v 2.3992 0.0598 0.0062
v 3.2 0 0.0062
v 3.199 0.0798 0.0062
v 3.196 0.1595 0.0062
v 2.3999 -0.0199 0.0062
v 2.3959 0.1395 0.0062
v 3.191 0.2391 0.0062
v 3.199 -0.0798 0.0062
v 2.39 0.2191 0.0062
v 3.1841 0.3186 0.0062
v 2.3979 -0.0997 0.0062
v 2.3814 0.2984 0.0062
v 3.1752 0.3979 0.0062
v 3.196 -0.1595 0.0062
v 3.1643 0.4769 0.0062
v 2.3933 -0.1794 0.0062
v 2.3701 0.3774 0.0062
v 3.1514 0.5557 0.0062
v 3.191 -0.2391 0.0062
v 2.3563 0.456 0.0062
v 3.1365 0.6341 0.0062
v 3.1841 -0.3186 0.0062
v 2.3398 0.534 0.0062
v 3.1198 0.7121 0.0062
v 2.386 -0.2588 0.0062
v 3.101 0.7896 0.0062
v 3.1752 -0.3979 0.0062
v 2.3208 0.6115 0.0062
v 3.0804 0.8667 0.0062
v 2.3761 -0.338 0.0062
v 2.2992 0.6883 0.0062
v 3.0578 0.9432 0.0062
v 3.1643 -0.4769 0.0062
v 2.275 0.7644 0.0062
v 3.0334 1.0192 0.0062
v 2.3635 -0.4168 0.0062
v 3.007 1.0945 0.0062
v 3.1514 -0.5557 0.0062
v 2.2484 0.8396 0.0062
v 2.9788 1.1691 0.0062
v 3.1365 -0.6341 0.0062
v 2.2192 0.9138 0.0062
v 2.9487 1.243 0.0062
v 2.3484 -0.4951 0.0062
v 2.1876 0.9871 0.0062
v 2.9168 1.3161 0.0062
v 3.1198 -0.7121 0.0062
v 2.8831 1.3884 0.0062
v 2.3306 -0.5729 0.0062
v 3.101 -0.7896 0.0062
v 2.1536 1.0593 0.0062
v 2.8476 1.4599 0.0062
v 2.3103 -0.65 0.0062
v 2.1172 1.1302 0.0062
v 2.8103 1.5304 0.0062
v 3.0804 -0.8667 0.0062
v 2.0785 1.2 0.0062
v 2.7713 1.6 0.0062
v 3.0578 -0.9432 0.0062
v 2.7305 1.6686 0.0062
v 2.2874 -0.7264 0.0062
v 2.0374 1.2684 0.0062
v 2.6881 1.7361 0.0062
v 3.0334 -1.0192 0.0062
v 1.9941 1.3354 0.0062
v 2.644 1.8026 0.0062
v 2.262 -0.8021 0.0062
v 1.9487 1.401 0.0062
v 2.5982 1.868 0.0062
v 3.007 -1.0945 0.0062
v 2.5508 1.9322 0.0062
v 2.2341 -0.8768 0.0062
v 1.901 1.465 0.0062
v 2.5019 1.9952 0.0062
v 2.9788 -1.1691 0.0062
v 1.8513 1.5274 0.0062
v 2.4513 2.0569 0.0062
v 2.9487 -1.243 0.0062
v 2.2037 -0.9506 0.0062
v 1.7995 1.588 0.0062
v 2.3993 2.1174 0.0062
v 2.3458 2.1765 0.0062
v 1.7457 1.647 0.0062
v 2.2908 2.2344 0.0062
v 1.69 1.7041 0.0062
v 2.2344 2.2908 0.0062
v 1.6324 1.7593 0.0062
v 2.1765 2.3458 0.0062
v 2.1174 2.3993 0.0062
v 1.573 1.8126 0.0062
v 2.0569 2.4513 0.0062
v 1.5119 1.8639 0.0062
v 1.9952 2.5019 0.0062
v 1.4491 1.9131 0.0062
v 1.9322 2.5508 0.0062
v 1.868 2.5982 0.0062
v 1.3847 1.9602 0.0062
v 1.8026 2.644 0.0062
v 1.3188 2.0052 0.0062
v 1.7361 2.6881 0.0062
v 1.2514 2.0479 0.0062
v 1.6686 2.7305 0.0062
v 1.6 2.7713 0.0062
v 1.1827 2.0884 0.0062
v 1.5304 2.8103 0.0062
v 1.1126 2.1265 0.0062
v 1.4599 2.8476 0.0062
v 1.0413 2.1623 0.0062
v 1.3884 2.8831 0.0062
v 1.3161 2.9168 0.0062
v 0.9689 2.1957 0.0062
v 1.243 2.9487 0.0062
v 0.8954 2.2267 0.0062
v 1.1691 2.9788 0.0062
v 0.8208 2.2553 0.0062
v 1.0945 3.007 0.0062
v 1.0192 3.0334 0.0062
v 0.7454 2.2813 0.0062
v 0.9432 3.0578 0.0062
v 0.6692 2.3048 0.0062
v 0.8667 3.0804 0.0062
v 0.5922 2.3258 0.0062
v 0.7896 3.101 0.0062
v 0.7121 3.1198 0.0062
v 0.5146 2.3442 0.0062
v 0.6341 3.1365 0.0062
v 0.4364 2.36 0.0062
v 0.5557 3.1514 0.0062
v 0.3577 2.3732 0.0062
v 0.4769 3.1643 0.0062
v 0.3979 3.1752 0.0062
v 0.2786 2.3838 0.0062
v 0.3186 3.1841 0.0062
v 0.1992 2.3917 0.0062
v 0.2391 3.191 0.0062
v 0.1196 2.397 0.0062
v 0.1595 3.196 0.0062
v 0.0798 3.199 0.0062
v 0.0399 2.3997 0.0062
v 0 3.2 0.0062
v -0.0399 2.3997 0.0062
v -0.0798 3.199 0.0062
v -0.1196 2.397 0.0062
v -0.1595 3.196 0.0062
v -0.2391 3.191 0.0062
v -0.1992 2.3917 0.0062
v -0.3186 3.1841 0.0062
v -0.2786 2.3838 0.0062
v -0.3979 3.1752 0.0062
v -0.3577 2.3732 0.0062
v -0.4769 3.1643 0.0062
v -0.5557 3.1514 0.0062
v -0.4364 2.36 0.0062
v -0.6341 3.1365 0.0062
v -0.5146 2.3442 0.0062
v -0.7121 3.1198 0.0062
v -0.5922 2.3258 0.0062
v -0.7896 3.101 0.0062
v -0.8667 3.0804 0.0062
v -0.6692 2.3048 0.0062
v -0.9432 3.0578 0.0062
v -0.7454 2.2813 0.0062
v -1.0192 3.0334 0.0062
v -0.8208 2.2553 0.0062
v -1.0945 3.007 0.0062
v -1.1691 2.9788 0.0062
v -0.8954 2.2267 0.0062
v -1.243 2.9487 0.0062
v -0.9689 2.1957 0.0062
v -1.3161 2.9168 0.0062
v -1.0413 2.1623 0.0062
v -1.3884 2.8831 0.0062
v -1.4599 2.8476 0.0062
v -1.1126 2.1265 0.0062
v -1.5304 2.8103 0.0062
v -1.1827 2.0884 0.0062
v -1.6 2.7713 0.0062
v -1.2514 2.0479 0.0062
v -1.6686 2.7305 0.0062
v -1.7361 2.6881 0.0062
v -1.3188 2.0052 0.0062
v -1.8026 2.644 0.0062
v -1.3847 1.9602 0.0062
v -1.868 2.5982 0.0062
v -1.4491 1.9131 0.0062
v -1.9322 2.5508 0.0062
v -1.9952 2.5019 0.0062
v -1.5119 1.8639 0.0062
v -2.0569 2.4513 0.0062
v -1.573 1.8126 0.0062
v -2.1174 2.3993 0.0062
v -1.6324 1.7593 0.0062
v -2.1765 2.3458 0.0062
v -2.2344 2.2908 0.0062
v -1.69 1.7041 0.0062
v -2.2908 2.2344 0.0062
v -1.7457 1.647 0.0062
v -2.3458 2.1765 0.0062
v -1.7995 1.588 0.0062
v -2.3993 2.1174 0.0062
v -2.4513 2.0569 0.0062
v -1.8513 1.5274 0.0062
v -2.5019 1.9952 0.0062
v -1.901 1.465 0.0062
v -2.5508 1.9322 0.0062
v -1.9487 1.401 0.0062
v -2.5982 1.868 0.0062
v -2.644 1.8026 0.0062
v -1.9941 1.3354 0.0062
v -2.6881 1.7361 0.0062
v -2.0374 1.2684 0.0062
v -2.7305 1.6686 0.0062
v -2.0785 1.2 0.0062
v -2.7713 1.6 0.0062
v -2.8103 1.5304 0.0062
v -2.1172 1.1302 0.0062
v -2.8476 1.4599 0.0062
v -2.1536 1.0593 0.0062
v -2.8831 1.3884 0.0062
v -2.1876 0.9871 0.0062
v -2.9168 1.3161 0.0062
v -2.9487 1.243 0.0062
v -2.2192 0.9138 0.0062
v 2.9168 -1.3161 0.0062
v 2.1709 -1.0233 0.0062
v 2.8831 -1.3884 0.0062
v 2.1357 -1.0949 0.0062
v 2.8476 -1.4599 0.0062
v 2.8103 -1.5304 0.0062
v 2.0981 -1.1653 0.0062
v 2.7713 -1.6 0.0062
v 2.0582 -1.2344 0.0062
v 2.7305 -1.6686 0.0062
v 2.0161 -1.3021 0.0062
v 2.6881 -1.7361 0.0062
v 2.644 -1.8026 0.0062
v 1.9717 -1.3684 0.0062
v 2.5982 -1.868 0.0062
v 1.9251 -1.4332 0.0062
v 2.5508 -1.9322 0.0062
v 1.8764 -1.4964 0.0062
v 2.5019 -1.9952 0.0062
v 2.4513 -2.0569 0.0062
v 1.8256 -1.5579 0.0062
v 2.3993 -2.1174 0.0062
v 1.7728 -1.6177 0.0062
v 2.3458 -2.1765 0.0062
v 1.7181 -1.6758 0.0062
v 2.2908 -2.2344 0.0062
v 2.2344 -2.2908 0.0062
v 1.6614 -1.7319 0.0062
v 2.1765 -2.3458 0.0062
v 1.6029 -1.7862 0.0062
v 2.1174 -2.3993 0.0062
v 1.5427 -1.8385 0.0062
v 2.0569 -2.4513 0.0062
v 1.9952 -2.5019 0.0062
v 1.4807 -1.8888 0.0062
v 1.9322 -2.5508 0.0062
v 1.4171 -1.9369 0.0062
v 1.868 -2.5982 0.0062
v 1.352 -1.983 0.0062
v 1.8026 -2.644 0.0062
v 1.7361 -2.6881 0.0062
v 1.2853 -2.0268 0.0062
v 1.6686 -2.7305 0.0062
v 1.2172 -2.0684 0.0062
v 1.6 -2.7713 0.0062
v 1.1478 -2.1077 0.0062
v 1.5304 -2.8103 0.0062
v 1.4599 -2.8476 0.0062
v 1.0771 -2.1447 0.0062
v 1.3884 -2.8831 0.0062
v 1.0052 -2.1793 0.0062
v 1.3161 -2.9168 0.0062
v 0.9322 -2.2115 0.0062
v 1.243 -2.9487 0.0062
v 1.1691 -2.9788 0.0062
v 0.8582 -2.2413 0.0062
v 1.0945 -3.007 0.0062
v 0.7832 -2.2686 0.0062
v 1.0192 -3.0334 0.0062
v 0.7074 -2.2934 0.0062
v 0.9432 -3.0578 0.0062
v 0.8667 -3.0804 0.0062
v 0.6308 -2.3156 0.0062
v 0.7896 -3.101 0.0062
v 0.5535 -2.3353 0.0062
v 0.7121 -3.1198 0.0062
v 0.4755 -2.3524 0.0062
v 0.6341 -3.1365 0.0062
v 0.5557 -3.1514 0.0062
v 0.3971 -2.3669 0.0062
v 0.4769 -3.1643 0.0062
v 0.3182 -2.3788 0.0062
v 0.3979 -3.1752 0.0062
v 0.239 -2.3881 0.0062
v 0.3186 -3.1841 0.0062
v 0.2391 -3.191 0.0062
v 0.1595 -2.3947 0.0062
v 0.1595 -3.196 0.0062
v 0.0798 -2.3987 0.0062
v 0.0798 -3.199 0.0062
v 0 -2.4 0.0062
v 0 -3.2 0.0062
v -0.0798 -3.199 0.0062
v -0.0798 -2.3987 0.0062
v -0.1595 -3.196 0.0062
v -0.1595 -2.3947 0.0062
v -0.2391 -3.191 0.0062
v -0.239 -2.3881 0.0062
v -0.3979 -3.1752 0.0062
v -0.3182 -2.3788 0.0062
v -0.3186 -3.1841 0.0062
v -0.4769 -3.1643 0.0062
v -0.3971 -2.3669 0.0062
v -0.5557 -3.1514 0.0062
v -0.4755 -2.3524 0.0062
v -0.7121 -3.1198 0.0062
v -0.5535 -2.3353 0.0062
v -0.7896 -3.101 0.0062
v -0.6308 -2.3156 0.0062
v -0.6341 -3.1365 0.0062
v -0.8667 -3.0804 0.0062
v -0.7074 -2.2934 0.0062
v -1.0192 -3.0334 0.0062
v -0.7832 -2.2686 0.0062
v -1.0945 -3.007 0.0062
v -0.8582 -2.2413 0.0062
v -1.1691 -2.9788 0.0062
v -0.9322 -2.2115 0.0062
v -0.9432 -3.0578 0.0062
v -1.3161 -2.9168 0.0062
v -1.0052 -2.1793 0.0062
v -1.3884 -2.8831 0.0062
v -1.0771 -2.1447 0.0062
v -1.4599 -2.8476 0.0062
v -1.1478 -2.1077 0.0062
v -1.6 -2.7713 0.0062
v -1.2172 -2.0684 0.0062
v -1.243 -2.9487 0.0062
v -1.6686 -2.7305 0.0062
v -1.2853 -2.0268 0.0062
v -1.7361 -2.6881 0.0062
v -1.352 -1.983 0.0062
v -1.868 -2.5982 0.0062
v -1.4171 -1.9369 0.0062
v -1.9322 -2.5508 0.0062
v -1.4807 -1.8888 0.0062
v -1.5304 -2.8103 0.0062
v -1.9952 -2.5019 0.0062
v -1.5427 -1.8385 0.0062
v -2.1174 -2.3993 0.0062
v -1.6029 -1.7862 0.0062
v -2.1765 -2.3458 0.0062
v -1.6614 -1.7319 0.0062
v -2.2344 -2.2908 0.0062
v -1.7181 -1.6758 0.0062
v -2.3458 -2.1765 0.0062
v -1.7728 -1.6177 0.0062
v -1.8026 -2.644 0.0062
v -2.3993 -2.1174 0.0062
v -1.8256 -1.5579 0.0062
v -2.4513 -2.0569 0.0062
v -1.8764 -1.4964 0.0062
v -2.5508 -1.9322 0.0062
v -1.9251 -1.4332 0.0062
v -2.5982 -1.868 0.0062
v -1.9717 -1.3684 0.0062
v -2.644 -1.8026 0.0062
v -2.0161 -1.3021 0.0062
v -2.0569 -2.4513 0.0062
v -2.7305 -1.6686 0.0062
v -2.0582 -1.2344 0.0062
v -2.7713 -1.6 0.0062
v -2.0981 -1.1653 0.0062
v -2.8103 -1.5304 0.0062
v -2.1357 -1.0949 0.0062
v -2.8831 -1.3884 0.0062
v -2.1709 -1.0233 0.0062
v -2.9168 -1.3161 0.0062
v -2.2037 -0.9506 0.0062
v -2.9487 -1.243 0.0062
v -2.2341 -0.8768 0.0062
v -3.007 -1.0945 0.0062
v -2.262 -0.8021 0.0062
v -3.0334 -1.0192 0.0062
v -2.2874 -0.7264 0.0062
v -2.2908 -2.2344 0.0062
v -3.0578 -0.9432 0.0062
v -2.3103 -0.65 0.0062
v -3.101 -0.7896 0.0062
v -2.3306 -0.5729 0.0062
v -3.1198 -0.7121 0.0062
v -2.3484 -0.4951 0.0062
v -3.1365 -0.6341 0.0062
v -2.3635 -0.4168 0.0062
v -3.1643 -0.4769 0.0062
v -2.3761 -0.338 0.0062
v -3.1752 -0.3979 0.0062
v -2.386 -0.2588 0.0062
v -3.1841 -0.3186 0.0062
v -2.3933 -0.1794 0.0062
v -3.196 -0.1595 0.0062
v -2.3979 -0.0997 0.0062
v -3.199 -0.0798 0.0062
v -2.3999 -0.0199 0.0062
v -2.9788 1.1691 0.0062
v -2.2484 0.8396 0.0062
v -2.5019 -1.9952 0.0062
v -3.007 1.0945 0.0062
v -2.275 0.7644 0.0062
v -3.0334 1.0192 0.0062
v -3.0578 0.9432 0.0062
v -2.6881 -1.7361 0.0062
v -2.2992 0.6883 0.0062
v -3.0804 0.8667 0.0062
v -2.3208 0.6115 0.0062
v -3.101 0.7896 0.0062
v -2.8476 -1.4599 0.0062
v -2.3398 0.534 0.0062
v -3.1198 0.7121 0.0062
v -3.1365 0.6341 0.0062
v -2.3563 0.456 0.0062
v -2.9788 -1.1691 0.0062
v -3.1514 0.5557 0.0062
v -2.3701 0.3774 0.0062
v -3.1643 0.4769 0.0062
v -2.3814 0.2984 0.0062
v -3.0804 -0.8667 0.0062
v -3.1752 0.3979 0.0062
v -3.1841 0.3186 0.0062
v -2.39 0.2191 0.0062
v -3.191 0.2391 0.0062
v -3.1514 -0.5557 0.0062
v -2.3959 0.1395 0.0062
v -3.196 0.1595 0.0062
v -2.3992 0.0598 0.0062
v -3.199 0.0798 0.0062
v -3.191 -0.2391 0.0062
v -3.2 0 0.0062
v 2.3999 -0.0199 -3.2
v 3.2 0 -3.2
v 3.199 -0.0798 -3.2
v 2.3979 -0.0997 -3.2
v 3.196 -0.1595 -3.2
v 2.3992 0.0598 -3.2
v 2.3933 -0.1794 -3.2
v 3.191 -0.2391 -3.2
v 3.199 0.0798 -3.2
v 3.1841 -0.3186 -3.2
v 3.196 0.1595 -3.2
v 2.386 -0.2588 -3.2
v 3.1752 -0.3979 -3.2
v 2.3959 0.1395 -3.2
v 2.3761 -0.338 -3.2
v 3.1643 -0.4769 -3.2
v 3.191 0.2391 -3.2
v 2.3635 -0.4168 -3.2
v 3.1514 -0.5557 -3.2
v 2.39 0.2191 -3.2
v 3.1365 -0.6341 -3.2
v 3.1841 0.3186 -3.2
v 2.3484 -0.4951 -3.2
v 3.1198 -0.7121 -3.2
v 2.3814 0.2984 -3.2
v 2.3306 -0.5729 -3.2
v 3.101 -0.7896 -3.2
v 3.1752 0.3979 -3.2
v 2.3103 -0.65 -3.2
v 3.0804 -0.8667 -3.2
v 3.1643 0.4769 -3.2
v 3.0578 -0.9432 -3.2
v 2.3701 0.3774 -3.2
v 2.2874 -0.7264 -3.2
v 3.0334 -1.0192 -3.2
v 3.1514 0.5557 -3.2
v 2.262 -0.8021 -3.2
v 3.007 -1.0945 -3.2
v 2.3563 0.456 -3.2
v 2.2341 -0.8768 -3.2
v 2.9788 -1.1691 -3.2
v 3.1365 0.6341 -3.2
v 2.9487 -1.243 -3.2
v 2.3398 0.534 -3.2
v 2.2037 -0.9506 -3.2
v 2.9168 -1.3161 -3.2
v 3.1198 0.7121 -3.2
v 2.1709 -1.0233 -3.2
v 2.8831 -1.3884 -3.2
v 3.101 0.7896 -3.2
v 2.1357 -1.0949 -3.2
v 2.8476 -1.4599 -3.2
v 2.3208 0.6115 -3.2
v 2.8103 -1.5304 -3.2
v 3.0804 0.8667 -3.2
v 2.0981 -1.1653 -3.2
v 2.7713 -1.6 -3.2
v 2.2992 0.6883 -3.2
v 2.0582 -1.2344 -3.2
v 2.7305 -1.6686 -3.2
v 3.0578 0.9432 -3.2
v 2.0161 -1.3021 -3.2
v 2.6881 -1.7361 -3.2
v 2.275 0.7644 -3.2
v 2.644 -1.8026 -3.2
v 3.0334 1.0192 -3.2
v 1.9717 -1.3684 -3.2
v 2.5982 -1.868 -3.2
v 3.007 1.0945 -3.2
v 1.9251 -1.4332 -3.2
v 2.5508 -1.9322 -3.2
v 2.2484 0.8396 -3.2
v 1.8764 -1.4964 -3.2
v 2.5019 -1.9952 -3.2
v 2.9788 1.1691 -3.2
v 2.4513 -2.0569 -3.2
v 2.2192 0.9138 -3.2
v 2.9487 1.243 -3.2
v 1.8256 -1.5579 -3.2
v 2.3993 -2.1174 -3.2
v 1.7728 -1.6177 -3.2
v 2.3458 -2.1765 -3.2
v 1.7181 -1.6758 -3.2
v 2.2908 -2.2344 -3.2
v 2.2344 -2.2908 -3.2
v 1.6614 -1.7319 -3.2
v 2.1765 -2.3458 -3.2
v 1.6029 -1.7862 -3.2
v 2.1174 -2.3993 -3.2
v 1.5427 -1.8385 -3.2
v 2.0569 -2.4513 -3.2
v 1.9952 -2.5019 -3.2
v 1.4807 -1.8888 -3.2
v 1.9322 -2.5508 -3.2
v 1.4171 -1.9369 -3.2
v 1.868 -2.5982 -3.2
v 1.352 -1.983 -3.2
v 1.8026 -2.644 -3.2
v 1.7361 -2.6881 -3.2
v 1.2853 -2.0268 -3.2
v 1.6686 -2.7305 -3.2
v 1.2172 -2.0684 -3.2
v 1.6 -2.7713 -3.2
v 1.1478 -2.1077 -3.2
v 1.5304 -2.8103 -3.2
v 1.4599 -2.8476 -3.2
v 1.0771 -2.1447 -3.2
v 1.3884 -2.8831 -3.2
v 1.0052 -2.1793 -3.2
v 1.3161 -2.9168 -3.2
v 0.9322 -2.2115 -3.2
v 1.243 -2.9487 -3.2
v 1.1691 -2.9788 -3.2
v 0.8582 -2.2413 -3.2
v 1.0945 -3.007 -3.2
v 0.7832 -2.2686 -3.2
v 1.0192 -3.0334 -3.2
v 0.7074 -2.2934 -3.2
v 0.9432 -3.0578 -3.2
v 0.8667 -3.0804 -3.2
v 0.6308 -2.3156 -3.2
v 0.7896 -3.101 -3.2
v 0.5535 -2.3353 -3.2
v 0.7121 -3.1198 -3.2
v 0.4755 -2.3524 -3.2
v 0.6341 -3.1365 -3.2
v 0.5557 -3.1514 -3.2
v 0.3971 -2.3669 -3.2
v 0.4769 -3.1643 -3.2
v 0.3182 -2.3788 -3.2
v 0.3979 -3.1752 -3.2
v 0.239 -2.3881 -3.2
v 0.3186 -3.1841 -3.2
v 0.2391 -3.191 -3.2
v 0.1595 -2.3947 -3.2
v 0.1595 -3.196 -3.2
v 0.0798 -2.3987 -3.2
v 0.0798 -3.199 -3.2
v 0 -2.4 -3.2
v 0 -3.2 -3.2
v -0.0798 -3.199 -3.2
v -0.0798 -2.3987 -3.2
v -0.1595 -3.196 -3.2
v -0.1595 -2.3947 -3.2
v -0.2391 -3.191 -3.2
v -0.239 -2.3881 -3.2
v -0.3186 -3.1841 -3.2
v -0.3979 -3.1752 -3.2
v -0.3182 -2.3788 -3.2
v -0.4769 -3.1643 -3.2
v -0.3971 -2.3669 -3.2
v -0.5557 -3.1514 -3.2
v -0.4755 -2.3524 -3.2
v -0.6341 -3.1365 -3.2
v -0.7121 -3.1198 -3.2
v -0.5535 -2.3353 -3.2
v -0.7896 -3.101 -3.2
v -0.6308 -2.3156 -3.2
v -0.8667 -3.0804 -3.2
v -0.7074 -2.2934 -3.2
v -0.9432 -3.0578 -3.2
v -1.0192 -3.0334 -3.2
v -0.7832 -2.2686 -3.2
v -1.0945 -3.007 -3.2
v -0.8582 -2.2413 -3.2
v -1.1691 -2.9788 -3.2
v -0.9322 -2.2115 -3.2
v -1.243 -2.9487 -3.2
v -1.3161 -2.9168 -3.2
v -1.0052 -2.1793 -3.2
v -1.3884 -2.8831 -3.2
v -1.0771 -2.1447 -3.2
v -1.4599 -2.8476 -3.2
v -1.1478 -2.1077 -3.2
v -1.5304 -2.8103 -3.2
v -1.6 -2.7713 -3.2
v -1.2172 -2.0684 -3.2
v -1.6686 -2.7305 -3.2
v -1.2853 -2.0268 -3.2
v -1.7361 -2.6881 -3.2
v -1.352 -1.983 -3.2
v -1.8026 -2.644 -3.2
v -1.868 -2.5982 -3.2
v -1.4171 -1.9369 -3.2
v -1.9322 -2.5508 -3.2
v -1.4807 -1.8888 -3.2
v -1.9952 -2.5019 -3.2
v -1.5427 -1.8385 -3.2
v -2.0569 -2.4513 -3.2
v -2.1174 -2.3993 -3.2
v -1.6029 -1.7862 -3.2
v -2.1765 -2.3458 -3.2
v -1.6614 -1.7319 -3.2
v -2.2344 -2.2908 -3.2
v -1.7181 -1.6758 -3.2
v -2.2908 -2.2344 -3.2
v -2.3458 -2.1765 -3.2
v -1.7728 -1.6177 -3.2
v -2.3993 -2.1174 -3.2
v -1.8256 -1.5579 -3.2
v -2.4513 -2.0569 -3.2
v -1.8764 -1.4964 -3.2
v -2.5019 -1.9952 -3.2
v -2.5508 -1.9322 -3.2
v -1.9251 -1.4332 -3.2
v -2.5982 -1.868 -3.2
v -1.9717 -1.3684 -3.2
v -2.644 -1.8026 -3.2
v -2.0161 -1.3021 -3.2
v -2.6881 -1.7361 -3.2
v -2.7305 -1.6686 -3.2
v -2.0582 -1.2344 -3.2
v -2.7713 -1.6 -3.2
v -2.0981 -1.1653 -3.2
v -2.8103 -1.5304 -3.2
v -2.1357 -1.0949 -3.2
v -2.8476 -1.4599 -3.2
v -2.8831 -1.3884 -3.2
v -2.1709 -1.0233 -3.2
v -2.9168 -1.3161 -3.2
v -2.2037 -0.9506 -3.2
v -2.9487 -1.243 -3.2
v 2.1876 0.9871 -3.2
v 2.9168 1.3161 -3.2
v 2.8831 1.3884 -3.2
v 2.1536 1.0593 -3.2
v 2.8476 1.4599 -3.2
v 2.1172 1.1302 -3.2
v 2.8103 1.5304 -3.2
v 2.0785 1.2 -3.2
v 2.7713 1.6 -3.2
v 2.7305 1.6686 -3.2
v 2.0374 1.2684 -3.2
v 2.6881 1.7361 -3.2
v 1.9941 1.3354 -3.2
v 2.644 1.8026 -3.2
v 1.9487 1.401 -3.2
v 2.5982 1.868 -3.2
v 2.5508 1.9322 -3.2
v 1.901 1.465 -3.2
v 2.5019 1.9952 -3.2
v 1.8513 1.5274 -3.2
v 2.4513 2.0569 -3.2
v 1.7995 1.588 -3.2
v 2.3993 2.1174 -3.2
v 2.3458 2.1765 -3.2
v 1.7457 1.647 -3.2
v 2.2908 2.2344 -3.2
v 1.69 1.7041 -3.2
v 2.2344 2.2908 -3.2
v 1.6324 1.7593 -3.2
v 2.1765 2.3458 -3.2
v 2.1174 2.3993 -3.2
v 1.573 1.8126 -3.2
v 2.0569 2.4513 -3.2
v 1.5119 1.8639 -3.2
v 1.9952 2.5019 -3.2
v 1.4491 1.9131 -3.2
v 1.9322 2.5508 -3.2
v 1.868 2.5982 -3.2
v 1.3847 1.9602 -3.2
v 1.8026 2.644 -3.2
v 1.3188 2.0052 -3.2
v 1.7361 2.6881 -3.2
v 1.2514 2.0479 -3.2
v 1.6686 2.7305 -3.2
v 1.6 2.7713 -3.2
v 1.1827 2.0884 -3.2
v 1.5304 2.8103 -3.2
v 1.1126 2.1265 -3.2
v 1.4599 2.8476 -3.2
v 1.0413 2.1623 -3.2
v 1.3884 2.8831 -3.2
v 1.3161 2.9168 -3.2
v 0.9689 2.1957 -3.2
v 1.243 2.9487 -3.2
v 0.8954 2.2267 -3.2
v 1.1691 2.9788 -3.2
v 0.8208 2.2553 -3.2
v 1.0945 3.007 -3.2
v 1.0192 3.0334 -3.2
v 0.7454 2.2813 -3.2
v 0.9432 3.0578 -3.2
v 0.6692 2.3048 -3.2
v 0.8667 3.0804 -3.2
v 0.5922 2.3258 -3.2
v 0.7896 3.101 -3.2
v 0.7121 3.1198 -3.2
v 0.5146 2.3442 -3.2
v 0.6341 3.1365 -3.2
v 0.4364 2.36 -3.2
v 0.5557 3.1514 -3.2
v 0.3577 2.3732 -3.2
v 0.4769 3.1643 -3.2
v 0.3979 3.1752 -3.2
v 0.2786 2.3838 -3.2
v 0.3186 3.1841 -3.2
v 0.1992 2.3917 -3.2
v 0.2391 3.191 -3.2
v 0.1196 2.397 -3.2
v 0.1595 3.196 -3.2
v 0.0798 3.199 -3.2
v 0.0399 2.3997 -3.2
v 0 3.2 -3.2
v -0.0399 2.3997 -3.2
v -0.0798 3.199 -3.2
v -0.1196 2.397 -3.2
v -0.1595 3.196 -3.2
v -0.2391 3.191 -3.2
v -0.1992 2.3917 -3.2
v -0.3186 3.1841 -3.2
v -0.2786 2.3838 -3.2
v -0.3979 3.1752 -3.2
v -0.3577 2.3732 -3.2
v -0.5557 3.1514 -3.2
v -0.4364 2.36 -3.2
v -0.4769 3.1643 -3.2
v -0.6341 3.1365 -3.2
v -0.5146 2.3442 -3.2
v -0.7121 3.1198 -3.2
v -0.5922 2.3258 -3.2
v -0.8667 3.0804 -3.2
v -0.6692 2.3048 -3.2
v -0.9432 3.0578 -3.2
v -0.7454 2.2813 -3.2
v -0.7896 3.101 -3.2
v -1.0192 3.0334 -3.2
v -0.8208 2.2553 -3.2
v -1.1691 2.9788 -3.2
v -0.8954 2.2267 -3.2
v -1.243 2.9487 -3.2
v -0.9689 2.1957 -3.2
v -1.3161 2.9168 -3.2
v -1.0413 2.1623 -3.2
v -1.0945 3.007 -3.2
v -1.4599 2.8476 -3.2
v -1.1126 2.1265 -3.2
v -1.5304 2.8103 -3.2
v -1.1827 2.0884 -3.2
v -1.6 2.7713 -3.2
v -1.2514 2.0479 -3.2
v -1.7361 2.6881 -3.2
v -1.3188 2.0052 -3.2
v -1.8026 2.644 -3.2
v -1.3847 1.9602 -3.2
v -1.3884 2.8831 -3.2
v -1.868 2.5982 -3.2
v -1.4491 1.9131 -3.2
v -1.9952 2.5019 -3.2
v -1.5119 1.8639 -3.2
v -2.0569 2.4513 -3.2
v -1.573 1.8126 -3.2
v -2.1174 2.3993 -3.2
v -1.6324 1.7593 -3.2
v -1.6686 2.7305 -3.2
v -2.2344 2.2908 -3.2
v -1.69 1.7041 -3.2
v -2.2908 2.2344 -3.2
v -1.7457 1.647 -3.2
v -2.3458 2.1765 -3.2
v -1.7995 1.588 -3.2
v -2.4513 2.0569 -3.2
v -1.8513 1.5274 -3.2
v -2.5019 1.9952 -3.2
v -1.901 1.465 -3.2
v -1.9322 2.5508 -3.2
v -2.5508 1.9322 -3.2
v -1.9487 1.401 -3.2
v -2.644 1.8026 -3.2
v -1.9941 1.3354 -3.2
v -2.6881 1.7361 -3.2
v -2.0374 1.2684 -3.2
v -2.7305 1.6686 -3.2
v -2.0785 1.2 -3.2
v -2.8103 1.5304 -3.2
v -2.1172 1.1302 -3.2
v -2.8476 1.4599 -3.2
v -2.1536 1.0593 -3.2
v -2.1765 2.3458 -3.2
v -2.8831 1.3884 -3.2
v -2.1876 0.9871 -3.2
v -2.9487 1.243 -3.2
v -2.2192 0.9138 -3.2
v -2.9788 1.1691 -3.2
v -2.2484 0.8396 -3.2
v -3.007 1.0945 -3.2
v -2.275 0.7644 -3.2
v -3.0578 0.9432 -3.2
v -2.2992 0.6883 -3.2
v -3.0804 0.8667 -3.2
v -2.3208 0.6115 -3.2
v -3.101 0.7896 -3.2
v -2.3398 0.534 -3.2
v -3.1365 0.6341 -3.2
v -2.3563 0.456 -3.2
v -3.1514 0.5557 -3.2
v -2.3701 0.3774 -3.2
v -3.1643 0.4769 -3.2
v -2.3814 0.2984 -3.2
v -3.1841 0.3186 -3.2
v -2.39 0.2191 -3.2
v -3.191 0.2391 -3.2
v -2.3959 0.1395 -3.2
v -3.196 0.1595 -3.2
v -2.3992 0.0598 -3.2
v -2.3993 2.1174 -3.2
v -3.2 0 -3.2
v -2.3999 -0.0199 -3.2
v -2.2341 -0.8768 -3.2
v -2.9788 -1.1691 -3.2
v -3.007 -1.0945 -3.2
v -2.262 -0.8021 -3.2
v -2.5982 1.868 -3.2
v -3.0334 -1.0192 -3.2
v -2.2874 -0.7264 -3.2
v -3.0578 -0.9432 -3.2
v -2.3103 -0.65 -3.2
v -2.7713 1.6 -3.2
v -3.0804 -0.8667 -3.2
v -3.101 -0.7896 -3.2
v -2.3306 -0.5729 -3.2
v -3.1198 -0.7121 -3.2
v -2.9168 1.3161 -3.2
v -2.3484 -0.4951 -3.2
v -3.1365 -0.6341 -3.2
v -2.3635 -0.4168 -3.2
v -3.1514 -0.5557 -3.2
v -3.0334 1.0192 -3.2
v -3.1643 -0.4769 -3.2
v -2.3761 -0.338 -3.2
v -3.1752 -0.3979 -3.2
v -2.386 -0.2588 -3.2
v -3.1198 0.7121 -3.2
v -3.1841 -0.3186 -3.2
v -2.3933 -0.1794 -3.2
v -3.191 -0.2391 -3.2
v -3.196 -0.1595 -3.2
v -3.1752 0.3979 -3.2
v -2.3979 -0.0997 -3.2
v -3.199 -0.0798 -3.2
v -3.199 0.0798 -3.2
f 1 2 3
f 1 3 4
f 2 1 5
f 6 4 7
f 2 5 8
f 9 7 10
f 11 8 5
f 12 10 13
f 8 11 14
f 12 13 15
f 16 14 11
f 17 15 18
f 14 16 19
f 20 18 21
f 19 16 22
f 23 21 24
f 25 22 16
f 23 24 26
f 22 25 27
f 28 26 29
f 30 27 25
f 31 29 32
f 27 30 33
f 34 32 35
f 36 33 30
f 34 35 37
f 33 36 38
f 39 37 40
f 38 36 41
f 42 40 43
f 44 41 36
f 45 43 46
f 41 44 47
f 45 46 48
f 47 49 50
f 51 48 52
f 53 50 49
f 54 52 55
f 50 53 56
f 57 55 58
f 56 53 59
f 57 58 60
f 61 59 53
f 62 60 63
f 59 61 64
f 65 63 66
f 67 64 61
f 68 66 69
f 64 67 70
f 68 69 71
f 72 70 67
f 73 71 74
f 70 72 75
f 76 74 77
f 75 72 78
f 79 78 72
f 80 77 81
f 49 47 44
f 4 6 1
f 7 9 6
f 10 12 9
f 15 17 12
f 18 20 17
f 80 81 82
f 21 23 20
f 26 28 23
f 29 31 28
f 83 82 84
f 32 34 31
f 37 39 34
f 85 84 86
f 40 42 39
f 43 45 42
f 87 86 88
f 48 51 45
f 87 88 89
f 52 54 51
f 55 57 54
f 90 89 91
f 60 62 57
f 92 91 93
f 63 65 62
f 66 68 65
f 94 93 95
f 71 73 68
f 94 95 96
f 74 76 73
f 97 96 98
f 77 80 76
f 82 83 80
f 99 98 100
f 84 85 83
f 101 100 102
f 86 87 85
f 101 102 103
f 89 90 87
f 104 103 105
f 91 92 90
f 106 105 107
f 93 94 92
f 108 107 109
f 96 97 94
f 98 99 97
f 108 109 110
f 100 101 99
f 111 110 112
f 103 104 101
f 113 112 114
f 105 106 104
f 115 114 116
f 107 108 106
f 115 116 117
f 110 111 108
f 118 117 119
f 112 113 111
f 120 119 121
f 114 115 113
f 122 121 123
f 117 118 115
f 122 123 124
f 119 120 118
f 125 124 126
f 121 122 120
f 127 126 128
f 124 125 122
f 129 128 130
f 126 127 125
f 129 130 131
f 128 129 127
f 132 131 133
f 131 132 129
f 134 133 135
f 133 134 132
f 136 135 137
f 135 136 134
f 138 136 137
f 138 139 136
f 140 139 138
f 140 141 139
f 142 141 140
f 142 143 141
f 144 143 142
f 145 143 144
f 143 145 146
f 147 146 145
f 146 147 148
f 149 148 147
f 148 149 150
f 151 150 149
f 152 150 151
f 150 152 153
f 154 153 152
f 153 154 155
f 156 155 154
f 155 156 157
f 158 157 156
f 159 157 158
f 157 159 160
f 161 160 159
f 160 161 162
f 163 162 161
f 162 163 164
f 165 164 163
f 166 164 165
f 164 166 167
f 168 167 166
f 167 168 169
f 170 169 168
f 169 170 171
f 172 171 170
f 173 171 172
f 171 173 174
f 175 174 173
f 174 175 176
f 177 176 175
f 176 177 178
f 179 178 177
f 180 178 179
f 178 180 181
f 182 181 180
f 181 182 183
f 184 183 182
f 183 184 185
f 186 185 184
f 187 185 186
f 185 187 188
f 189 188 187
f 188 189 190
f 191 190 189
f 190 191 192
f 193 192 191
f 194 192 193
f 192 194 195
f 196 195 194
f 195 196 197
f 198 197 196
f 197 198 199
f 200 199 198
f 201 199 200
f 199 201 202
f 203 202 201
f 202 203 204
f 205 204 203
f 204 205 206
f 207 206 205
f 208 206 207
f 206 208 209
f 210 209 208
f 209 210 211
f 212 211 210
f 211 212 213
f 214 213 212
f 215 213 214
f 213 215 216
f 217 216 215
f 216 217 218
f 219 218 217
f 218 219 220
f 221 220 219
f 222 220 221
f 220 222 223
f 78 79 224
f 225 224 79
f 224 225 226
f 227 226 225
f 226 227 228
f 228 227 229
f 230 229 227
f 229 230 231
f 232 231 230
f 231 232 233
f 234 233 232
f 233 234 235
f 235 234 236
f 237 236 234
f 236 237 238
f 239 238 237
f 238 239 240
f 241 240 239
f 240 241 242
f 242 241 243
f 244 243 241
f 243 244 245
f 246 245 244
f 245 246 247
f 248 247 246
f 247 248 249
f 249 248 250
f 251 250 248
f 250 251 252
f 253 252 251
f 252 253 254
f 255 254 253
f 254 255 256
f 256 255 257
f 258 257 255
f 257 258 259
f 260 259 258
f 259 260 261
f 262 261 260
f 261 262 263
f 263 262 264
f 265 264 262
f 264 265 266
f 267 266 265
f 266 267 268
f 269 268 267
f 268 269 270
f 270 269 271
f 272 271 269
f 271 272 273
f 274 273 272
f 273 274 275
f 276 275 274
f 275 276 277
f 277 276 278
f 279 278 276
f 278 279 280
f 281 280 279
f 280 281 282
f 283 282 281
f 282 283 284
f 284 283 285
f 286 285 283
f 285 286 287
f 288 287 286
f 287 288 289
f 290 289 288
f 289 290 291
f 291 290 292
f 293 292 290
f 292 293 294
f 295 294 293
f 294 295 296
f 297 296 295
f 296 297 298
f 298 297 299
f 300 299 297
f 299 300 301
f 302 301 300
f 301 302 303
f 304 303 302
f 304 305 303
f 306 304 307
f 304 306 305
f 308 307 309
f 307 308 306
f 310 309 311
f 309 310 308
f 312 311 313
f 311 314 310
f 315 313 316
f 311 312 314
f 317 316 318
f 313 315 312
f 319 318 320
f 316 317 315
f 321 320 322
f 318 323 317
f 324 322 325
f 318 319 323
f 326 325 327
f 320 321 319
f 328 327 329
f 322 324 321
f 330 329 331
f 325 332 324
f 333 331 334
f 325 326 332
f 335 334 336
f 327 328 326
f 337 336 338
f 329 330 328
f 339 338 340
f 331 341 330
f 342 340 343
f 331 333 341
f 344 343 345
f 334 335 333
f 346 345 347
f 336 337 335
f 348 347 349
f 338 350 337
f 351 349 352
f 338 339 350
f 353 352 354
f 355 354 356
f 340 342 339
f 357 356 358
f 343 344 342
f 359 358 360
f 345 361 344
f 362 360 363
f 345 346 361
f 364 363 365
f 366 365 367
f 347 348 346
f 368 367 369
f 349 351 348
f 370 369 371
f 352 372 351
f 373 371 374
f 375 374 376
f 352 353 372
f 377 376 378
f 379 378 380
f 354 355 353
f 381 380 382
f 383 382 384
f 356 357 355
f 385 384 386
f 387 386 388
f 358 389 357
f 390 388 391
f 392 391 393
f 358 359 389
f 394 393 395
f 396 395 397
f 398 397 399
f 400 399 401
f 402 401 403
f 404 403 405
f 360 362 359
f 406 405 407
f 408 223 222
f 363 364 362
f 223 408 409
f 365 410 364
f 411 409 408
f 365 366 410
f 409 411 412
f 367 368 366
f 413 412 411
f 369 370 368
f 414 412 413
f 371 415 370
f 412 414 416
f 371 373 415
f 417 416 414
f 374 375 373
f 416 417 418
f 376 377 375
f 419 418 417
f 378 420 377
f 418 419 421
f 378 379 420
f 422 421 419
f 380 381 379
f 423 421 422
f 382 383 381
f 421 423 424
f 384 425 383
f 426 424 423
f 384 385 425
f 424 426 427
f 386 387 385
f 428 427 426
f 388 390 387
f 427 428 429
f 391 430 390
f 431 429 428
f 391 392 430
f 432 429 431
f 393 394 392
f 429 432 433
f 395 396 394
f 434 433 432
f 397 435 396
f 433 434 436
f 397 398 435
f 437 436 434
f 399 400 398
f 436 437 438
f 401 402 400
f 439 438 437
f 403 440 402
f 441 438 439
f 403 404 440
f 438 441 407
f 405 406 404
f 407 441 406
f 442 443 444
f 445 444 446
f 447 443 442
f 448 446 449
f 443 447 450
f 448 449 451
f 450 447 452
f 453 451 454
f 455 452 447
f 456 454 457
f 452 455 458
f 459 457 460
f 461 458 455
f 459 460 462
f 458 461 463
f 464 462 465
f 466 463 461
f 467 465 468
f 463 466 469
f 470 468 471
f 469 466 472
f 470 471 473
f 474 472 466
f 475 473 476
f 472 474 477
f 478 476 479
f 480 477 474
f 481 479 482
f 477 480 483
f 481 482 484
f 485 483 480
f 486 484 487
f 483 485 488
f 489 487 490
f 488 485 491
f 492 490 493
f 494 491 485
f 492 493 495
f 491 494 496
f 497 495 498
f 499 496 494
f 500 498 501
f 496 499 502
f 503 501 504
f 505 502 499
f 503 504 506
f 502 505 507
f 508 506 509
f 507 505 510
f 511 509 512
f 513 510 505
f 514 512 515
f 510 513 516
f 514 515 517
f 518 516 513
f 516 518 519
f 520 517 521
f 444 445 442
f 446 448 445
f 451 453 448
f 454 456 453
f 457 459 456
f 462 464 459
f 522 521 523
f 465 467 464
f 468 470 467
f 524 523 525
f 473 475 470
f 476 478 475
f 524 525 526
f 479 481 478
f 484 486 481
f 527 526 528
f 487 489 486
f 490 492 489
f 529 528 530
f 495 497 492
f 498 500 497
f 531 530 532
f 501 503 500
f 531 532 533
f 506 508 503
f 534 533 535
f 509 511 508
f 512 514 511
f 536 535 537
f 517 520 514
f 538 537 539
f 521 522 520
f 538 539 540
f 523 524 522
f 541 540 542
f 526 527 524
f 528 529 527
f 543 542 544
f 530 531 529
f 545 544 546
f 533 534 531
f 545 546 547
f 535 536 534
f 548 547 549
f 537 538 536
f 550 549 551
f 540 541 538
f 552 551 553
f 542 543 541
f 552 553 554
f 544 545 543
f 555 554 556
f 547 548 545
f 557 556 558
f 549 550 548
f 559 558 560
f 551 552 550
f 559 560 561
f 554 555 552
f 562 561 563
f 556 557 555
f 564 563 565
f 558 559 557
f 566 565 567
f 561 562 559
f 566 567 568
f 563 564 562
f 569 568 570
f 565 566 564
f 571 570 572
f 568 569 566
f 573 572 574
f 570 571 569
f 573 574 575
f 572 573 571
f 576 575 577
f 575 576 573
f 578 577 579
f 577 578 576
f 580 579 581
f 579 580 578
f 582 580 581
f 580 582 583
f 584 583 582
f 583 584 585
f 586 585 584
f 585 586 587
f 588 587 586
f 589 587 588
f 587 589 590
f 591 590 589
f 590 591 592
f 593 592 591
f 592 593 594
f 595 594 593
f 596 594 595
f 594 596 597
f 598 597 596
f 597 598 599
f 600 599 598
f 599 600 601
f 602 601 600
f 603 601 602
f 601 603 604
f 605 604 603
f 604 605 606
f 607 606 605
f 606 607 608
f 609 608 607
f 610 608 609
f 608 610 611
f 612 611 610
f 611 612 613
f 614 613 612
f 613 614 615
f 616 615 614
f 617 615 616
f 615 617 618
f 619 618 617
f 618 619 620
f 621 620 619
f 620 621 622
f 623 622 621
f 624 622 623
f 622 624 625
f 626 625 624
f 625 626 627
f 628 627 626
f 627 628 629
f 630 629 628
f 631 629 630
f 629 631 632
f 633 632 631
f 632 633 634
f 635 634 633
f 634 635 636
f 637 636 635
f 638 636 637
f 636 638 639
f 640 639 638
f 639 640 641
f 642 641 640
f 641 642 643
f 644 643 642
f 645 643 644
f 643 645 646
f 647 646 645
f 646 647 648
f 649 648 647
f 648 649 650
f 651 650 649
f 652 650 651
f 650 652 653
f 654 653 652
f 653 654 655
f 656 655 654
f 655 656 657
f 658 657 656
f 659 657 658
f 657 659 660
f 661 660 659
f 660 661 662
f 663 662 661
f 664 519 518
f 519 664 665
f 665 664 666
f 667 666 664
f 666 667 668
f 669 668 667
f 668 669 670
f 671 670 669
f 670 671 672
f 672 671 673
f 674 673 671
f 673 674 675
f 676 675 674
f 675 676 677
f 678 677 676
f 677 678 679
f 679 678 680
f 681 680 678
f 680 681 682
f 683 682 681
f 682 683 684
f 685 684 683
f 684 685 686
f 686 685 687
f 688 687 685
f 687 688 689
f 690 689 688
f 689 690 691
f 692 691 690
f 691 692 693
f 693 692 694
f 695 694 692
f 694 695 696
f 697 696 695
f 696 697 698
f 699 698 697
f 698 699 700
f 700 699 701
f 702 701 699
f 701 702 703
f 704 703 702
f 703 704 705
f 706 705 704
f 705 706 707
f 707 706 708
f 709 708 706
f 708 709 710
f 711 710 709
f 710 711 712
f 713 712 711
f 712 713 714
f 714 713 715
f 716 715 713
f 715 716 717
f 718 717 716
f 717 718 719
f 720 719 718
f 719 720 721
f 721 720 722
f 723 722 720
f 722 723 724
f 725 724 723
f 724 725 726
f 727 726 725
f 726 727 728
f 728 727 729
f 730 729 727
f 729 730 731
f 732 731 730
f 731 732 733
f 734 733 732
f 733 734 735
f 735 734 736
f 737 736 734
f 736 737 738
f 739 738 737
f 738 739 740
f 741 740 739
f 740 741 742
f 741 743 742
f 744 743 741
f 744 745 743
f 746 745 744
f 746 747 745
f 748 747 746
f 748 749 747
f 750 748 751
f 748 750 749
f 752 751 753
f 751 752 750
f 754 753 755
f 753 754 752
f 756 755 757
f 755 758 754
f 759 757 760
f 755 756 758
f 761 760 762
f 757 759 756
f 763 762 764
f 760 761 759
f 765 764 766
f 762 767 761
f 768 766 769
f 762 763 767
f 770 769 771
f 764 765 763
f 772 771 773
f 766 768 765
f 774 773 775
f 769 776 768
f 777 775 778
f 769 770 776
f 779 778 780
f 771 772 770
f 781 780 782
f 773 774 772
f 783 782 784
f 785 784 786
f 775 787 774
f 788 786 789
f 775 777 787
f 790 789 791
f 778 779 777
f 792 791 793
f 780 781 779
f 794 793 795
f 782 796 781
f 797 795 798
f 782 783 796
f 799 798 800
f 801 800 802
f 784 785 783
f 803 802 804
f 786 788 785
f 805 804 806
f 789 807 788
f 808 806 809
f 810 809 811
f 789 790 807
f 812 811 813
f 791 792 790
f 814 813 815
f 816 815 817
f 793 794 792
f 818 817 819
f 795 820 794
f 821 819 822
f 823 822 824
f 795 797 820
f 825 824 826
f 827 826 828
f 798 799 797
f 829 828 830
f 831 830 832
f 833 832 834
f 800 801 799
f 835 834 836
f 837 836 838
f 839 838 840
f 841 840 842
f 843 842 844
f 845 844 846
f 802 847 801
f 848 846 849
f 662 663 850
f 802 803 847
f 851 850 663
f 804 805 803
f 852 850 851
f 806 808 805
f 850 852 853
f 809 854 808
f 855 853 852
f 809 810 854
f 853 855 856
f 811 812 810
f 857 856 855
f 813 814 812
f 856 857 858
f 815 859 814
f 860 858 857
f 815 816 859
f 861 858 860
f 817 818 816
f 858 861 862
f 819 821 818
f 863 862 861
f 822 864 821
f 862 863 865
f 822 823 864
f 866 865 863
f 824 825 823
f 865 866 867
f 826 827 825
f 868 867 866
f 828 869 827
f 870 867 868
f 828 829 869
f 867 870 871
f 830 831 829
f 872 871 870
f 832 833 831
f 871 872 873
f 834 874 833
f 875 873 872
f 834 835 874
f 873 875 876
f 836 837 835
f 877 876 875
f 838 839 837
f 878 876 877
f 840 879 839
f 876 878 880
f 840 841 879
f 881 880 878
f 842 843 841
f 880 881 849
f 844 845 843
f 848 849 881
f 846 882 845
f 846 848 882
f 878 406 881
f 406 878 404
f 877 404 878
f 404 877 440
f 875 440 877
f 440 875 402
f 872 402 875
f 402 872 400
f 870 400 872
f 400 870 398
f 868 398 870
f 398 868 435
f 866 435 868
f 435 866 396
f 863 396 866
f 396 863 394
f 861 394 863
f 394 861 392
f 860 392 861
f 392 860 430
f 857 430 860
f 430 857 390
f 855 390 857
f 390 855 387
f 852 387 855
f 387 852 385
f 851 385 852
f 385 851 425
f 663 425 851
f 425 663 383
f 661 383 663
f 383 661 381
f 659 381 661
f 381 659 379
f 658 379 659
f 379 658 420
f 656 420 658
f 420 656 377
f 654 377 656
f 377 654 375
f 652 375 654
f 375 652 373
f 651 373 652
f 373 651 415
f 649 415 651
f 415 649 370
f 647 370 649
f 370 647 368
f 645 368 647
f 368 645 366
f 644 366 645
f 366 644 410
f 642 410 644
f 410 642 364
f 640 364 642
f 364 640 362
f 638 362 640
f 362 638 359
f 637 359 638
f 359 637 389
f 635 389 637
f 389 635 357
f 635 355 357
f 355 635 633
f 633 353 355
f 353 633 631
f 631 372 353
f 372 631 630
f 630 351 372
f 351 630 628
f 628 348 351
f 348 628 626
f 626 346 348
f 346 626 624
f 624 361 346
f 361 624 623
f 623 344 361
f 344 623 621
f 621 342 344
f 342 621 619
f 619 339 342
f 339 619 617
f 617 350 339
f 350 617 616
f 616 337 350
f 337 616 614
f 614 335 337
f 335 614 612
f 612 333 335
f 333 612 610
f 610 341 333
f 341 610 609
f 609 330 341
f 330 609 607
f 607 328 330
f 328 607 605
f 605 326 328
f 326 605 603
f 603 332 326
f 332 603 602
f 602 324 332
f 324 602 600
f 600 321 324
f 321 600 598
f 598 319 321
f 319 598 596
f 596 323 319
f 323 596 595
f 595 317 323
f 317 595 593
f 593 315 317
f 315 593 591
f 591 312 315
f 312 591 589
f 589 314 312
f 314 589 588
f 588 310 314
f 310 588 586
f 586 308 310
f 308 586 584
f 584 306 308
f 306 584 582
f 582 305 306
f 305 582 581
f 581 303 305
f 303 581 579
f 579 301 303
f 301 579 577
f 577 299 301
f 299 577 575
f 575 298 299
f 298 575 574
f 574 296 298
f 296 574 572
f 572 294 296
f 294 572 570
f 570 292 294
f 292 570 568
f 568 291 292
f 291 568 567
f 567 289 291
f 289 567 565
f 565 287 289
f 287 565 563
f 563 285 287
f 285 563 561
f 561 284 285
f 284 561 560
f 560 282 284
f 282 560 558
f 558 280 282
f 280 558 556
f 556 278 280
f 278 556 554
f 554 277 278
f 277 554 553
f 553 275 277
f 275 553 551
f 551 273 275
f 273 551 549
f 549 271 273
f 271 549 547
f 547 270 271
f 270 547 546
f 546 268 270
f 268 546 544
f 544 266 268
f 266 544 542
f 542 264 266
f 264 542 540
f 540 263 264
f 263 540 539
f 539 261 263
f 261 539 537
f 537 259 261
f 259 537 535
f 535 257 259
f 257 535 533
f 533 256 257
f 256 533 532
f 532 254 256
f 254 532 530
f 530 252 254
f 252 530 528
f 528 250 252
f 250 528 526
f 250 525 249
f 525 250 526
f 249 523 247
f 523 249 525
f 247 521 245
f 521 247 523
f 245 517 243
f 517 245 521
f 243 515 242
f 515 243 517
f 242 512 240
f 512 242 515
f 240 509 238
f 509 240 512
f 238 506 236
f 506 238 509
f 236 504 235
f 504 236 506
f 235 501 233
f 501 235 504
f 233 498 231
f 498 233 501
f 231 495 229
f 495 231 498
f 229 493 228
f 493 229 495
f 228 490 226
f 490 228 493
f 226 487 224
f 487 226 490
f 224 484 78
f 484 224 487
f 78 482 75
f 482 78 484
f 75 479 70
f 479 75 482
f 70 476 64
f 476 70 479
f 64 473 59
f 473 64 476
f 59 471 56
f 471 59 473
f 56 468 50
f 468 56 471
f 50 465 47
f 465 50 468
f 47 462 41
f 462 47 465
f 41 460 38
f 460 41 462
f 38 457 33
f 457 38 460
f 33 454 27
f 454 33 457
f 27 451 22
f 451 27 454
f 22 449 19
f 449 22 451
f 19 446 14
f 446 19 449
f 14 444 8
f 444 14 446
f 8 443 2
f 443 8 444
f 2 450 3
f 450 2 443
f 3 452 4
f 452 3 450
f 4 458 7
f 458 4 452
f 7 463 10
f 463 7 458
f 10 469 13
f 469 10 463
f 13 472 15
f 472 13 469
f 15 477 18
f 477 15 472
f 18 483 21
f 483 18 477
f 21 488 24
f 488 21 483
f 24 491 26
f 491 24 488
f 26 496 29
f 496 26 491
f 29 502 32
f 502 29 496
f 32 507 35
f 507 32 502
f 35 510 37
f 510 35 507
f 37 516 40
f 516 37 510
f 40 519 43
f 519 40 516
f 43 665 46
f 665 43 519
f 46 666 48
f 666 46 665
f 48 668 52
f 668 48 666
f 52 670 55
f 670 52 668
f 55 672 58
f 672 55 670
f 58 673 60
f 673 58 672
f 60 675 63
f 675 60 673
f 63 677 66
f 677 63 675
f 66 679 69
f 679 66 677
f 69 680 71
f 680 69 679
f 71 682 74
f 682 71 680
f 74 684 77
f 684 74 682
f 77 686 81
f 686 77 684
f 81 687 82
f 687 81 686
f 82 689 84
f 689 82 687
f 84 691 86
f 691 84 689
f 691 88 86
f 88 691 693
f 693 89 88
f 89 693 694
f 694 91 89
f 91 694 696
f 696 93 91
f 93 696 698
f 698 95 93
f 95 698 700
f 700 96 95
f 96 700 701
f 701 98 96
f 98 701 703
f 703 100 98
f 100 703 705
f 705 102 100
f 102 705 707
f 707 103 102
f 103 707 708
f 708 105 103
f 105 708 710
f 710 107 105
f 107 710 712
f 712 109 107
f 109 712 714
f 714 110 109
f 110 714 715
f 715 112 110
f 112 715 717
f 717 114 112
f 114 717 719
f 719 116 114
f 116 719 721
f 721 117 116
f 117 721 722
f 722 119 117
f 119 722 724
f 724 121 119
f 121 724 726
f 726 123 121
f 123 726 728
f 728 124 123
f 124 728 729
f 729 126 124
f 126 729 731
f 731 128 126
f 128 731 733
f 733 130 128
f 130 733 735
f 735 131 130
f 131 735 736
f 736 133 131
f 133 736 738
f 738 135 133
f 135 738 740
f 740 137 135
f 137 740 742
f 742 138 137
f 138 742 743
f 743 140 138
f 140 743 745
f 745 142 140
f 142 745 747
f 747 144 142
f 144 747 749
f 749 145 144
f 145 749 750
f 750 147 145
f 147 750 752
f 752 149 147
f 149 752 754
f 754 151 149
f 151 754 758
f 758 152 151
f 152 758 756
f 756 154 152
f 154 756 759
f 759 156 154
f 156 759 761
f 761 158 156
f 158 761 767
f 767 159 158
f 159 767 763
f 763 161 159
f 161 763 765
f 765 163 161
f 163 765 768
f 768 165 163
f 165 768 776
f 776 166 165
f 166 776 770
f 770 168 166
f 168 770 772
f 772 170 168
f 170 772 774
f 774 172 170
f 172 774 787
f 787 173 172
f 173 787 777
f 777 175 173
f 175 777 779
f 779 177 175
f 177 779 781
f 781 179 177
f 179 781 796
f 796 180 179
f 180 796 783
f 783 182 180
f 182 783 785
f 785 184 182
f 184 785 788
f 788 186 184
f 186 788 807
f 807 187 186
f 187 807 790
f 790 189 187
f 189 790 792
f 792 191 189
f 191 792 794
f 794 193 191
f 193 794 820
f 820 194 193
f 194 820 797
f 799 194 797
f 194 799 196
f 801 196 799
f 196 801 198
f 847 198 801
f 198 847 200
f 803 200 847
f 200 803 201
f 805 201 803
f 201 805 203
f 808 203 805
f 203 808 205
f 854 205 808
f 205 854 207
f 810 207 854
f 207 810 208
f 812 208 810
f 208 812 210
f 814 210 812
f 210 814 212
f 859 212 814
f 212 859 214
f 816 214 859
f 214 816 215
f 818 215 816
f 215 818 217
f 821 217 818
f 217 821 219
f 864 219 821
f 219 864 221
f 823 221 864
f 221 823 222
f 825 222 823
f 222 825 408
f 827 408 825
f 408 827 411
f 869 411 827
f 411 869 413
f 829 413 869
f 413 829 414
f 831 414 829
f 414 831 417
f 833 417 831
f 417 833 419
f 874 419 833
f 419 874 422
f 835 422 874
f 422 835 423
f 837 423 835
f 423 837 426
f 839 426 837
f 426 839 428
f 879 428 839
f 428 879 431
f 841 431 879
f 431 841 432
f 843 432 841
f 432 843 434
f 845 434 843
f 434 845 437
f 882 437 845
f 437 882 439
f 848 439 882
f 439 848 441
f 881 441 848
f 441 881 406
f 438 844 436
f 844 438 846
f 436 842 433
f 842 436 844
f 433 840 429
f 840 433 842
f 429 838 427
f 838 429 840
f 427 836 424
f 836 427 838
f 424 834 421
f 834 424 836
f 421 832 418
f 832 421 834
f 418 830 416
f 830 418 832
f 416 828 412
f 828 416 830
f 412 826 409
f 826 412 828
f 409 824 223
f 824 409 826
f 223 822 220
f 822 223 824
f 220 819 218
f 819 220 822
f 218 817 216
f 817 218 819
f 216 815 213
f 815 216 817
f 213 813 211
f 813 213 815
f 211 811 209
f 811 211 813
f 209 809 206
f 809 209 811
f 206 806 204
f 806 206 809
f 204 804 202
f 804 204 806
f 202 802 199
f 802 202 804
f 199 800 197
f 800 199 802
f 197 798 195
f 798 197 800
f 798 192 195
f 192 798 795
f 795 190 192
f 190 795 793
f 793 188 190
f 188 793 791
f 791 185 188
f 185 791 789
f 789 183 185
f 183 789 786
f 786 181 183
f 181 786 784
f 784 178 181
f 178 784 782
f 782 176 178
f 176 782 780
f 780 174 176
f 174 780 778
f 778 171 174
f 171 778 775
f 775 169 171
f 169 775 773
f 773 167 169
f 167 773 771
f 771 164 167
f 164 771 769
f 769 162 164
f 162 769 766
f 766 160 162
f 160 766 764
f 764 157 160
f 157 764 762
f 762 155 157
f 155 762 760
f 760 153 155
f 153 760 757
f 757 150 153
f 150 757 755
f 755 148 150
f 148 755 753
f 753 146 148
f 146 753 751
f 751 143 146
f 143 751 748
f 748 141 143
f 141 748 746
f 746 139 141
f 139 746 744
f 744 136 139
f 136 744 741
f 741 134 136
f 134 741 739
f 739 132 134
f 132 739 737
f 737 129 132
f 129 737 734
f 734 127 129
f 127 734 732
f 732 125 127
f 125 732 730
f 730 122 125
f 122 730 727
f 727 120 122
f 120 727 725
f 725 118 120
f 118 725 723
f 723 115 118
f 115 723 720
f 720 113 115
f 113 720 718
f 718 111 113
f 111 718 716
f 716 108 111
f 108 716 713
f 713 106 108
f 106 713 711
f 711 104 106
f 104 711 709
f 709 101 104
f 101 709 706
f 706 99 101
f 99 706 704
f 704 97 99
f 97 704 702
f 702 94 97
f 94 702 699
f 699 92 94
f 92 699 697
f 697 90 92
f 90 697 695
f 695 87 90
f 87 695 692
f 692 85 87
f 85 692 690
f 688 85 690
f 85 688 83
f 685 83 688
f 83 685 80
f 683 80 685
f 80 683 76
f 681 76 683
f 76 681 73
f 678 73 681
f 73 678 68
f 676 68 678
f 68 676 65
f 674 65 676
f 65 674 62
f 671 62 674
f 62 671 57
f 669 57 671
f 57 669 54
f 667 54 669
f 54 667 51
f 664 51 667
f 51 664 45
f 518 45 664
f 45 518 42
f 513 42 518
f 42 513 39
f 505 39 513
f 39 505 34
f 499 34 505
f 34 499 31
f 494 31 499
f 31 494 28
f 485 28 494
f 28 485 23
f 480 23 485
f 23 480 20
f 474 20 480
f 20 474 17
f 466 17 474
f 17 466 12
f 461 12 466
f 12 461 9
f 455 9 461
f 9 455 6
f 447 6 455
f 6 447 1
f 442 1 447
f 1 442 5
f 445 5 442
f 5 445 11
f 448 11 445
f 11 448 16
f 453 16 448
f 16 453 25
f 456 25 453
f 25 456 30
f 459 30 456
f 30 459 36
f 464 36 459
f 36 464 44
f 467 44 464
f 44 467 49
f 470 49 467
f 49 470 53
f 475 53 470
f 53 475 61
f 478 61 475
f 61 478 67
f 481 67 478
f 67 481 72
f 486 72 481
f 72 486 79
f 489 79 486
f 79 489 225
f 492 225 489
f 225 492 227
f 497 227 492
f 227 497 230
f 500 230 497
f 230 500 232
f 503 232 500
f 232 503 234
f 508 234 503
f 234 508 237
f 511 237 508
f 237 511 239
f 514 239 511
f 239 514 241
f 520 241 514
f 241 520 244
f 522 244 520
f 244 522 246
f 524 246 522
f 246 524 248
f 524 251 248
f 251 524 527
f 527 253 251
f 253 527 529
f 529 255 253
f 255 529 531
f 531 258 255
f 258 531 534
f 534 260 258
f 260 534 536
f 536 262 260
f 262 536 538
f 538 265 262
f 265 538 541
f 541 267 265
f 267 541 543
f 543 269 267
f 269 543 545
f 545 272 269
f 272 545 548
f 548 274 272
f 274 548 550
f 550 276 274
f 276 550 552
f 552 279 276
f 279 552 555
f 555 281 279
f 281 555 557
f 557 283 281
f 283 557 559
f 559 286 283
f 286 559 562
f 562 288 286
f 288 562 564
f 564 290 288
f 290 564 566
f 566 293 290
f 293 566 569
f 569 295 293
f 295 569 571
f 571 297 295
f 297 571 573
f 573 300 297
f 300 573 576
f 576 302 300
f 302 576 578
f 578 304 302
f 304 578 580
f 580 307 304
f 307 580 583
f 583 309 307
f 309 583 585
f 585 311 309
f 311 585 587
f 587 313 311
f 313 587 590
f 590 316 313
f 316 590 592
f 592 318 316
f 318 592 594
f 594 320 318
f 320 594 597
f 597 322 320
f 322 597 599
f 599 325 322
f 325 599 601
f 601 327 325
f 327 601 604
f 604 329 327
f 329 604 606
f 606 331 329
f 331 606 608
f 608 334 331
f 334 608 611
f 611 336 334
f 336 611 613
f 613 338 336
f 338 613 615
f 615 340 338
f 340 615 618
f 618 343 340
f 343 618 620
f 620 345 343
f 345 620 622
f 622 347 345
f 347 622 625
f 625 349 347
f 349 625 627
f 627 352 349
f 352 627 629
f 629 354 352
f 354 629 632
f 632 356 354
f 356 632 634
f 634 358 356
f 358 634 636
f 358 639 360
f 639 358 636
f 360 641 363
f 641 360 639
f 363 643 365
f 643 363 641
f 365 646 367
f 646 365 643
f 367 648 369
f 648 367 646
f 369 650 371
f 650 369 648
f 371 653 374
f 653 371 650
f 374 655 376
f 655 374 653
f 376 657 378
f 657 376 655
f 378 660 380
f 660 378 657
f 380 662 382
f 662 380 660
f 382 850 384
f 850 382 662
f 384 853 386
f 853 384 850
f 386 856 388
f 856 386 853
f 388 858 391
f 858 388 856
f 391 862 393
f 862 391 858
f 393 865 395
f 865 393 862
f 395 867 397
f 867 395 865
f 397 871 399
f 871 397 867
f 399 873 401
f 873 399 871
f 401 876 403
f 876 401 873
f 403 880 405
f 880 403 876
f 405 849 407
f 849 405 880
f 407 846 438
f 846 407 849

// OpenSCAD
use <../lib.scad>
use <s/30109s01.scad>
use <../p/stud4.scad>
$fa=1; $fs=0.2;
function ldraw_lib__30109(realsolid=false) = [
// 0 Container Basket  2 x  4.5 x  2
// 0 Name: 30109.dat
// 0 Author: Chris Dee [cwdee]
// 0 !LDRAW_ORG Part UPDATE 2012-03
// 0 !LICENSE Licensed under CC BY 2.0 and CC BY 4.0 : see CAreadme.txt
// 
// 0 !HELP Place handle (71861.dat) at y = -34.5
// 0 !HELP Grip of handle will then be at y = -65.75
// 
// 0 BFC CERTIFY CCW
  [0,"BFC","CERTIFY"],
  [0,"BFC","CCW"],
// 
// 0 !HISTORY 2012-11-23 [MMR1988] Correction and made a quarter subpart of the file
// 0 !HISTORY 2012-12-28 [PTadmin] Official Update 2012-03
// 
// 
// 1 16 0 0 0 1 0 0 0 1 0 0 0 1 s\30109s01.dat
  [1,16,0,0,0,1,0,0,0,1,0,0,0,1, ldraw_lib__s__30109s01(realsolid)],
// 1 16 0 0 0 -1 0 0 0 1 0 0 0 1 s\30109s01.dat
  [1,16,0,0,0,-1,0,0,0,1,0,0,0,1, ldraw_lib__s__30109s01(realsolid)],
// 1 16 0 0 0 1 0 0 0 1 0 0 0 -1 s\30109s01.dat
  [1,16,0,0,0,1,0,0,0,1,0,0,0,-1, ldraw_lib__s__30109s01(realsolid)],
// 1 16 0 0 0 -1 0 0 0 1 0 0 0 -1 s\30109s01.dat
  [1,16,0,0,0,-1,0,0,0,1,0,0,0,-1, ldraw_lib__s__30109s01(realsolid)],
// 
// 1 16 0 0 0 1 0 0 0 -2 0 0 0 1 stud4.dat
  [1,16,0,0,0,1,0,0,0,-2,0,0,0,1, ldraw_lib__stud4(realsolid)],
];
module ldraw_lib__30109(step=0, col=false, unit=2/5, alt=false, line=0.2, solid=!$preview)
    makepoly(ldraw_lib__30109(solid), step=step, col=col, unit=unit, alt=alt, line=line, solid=solid);
ldraw_lib__30109(line=0.2);
